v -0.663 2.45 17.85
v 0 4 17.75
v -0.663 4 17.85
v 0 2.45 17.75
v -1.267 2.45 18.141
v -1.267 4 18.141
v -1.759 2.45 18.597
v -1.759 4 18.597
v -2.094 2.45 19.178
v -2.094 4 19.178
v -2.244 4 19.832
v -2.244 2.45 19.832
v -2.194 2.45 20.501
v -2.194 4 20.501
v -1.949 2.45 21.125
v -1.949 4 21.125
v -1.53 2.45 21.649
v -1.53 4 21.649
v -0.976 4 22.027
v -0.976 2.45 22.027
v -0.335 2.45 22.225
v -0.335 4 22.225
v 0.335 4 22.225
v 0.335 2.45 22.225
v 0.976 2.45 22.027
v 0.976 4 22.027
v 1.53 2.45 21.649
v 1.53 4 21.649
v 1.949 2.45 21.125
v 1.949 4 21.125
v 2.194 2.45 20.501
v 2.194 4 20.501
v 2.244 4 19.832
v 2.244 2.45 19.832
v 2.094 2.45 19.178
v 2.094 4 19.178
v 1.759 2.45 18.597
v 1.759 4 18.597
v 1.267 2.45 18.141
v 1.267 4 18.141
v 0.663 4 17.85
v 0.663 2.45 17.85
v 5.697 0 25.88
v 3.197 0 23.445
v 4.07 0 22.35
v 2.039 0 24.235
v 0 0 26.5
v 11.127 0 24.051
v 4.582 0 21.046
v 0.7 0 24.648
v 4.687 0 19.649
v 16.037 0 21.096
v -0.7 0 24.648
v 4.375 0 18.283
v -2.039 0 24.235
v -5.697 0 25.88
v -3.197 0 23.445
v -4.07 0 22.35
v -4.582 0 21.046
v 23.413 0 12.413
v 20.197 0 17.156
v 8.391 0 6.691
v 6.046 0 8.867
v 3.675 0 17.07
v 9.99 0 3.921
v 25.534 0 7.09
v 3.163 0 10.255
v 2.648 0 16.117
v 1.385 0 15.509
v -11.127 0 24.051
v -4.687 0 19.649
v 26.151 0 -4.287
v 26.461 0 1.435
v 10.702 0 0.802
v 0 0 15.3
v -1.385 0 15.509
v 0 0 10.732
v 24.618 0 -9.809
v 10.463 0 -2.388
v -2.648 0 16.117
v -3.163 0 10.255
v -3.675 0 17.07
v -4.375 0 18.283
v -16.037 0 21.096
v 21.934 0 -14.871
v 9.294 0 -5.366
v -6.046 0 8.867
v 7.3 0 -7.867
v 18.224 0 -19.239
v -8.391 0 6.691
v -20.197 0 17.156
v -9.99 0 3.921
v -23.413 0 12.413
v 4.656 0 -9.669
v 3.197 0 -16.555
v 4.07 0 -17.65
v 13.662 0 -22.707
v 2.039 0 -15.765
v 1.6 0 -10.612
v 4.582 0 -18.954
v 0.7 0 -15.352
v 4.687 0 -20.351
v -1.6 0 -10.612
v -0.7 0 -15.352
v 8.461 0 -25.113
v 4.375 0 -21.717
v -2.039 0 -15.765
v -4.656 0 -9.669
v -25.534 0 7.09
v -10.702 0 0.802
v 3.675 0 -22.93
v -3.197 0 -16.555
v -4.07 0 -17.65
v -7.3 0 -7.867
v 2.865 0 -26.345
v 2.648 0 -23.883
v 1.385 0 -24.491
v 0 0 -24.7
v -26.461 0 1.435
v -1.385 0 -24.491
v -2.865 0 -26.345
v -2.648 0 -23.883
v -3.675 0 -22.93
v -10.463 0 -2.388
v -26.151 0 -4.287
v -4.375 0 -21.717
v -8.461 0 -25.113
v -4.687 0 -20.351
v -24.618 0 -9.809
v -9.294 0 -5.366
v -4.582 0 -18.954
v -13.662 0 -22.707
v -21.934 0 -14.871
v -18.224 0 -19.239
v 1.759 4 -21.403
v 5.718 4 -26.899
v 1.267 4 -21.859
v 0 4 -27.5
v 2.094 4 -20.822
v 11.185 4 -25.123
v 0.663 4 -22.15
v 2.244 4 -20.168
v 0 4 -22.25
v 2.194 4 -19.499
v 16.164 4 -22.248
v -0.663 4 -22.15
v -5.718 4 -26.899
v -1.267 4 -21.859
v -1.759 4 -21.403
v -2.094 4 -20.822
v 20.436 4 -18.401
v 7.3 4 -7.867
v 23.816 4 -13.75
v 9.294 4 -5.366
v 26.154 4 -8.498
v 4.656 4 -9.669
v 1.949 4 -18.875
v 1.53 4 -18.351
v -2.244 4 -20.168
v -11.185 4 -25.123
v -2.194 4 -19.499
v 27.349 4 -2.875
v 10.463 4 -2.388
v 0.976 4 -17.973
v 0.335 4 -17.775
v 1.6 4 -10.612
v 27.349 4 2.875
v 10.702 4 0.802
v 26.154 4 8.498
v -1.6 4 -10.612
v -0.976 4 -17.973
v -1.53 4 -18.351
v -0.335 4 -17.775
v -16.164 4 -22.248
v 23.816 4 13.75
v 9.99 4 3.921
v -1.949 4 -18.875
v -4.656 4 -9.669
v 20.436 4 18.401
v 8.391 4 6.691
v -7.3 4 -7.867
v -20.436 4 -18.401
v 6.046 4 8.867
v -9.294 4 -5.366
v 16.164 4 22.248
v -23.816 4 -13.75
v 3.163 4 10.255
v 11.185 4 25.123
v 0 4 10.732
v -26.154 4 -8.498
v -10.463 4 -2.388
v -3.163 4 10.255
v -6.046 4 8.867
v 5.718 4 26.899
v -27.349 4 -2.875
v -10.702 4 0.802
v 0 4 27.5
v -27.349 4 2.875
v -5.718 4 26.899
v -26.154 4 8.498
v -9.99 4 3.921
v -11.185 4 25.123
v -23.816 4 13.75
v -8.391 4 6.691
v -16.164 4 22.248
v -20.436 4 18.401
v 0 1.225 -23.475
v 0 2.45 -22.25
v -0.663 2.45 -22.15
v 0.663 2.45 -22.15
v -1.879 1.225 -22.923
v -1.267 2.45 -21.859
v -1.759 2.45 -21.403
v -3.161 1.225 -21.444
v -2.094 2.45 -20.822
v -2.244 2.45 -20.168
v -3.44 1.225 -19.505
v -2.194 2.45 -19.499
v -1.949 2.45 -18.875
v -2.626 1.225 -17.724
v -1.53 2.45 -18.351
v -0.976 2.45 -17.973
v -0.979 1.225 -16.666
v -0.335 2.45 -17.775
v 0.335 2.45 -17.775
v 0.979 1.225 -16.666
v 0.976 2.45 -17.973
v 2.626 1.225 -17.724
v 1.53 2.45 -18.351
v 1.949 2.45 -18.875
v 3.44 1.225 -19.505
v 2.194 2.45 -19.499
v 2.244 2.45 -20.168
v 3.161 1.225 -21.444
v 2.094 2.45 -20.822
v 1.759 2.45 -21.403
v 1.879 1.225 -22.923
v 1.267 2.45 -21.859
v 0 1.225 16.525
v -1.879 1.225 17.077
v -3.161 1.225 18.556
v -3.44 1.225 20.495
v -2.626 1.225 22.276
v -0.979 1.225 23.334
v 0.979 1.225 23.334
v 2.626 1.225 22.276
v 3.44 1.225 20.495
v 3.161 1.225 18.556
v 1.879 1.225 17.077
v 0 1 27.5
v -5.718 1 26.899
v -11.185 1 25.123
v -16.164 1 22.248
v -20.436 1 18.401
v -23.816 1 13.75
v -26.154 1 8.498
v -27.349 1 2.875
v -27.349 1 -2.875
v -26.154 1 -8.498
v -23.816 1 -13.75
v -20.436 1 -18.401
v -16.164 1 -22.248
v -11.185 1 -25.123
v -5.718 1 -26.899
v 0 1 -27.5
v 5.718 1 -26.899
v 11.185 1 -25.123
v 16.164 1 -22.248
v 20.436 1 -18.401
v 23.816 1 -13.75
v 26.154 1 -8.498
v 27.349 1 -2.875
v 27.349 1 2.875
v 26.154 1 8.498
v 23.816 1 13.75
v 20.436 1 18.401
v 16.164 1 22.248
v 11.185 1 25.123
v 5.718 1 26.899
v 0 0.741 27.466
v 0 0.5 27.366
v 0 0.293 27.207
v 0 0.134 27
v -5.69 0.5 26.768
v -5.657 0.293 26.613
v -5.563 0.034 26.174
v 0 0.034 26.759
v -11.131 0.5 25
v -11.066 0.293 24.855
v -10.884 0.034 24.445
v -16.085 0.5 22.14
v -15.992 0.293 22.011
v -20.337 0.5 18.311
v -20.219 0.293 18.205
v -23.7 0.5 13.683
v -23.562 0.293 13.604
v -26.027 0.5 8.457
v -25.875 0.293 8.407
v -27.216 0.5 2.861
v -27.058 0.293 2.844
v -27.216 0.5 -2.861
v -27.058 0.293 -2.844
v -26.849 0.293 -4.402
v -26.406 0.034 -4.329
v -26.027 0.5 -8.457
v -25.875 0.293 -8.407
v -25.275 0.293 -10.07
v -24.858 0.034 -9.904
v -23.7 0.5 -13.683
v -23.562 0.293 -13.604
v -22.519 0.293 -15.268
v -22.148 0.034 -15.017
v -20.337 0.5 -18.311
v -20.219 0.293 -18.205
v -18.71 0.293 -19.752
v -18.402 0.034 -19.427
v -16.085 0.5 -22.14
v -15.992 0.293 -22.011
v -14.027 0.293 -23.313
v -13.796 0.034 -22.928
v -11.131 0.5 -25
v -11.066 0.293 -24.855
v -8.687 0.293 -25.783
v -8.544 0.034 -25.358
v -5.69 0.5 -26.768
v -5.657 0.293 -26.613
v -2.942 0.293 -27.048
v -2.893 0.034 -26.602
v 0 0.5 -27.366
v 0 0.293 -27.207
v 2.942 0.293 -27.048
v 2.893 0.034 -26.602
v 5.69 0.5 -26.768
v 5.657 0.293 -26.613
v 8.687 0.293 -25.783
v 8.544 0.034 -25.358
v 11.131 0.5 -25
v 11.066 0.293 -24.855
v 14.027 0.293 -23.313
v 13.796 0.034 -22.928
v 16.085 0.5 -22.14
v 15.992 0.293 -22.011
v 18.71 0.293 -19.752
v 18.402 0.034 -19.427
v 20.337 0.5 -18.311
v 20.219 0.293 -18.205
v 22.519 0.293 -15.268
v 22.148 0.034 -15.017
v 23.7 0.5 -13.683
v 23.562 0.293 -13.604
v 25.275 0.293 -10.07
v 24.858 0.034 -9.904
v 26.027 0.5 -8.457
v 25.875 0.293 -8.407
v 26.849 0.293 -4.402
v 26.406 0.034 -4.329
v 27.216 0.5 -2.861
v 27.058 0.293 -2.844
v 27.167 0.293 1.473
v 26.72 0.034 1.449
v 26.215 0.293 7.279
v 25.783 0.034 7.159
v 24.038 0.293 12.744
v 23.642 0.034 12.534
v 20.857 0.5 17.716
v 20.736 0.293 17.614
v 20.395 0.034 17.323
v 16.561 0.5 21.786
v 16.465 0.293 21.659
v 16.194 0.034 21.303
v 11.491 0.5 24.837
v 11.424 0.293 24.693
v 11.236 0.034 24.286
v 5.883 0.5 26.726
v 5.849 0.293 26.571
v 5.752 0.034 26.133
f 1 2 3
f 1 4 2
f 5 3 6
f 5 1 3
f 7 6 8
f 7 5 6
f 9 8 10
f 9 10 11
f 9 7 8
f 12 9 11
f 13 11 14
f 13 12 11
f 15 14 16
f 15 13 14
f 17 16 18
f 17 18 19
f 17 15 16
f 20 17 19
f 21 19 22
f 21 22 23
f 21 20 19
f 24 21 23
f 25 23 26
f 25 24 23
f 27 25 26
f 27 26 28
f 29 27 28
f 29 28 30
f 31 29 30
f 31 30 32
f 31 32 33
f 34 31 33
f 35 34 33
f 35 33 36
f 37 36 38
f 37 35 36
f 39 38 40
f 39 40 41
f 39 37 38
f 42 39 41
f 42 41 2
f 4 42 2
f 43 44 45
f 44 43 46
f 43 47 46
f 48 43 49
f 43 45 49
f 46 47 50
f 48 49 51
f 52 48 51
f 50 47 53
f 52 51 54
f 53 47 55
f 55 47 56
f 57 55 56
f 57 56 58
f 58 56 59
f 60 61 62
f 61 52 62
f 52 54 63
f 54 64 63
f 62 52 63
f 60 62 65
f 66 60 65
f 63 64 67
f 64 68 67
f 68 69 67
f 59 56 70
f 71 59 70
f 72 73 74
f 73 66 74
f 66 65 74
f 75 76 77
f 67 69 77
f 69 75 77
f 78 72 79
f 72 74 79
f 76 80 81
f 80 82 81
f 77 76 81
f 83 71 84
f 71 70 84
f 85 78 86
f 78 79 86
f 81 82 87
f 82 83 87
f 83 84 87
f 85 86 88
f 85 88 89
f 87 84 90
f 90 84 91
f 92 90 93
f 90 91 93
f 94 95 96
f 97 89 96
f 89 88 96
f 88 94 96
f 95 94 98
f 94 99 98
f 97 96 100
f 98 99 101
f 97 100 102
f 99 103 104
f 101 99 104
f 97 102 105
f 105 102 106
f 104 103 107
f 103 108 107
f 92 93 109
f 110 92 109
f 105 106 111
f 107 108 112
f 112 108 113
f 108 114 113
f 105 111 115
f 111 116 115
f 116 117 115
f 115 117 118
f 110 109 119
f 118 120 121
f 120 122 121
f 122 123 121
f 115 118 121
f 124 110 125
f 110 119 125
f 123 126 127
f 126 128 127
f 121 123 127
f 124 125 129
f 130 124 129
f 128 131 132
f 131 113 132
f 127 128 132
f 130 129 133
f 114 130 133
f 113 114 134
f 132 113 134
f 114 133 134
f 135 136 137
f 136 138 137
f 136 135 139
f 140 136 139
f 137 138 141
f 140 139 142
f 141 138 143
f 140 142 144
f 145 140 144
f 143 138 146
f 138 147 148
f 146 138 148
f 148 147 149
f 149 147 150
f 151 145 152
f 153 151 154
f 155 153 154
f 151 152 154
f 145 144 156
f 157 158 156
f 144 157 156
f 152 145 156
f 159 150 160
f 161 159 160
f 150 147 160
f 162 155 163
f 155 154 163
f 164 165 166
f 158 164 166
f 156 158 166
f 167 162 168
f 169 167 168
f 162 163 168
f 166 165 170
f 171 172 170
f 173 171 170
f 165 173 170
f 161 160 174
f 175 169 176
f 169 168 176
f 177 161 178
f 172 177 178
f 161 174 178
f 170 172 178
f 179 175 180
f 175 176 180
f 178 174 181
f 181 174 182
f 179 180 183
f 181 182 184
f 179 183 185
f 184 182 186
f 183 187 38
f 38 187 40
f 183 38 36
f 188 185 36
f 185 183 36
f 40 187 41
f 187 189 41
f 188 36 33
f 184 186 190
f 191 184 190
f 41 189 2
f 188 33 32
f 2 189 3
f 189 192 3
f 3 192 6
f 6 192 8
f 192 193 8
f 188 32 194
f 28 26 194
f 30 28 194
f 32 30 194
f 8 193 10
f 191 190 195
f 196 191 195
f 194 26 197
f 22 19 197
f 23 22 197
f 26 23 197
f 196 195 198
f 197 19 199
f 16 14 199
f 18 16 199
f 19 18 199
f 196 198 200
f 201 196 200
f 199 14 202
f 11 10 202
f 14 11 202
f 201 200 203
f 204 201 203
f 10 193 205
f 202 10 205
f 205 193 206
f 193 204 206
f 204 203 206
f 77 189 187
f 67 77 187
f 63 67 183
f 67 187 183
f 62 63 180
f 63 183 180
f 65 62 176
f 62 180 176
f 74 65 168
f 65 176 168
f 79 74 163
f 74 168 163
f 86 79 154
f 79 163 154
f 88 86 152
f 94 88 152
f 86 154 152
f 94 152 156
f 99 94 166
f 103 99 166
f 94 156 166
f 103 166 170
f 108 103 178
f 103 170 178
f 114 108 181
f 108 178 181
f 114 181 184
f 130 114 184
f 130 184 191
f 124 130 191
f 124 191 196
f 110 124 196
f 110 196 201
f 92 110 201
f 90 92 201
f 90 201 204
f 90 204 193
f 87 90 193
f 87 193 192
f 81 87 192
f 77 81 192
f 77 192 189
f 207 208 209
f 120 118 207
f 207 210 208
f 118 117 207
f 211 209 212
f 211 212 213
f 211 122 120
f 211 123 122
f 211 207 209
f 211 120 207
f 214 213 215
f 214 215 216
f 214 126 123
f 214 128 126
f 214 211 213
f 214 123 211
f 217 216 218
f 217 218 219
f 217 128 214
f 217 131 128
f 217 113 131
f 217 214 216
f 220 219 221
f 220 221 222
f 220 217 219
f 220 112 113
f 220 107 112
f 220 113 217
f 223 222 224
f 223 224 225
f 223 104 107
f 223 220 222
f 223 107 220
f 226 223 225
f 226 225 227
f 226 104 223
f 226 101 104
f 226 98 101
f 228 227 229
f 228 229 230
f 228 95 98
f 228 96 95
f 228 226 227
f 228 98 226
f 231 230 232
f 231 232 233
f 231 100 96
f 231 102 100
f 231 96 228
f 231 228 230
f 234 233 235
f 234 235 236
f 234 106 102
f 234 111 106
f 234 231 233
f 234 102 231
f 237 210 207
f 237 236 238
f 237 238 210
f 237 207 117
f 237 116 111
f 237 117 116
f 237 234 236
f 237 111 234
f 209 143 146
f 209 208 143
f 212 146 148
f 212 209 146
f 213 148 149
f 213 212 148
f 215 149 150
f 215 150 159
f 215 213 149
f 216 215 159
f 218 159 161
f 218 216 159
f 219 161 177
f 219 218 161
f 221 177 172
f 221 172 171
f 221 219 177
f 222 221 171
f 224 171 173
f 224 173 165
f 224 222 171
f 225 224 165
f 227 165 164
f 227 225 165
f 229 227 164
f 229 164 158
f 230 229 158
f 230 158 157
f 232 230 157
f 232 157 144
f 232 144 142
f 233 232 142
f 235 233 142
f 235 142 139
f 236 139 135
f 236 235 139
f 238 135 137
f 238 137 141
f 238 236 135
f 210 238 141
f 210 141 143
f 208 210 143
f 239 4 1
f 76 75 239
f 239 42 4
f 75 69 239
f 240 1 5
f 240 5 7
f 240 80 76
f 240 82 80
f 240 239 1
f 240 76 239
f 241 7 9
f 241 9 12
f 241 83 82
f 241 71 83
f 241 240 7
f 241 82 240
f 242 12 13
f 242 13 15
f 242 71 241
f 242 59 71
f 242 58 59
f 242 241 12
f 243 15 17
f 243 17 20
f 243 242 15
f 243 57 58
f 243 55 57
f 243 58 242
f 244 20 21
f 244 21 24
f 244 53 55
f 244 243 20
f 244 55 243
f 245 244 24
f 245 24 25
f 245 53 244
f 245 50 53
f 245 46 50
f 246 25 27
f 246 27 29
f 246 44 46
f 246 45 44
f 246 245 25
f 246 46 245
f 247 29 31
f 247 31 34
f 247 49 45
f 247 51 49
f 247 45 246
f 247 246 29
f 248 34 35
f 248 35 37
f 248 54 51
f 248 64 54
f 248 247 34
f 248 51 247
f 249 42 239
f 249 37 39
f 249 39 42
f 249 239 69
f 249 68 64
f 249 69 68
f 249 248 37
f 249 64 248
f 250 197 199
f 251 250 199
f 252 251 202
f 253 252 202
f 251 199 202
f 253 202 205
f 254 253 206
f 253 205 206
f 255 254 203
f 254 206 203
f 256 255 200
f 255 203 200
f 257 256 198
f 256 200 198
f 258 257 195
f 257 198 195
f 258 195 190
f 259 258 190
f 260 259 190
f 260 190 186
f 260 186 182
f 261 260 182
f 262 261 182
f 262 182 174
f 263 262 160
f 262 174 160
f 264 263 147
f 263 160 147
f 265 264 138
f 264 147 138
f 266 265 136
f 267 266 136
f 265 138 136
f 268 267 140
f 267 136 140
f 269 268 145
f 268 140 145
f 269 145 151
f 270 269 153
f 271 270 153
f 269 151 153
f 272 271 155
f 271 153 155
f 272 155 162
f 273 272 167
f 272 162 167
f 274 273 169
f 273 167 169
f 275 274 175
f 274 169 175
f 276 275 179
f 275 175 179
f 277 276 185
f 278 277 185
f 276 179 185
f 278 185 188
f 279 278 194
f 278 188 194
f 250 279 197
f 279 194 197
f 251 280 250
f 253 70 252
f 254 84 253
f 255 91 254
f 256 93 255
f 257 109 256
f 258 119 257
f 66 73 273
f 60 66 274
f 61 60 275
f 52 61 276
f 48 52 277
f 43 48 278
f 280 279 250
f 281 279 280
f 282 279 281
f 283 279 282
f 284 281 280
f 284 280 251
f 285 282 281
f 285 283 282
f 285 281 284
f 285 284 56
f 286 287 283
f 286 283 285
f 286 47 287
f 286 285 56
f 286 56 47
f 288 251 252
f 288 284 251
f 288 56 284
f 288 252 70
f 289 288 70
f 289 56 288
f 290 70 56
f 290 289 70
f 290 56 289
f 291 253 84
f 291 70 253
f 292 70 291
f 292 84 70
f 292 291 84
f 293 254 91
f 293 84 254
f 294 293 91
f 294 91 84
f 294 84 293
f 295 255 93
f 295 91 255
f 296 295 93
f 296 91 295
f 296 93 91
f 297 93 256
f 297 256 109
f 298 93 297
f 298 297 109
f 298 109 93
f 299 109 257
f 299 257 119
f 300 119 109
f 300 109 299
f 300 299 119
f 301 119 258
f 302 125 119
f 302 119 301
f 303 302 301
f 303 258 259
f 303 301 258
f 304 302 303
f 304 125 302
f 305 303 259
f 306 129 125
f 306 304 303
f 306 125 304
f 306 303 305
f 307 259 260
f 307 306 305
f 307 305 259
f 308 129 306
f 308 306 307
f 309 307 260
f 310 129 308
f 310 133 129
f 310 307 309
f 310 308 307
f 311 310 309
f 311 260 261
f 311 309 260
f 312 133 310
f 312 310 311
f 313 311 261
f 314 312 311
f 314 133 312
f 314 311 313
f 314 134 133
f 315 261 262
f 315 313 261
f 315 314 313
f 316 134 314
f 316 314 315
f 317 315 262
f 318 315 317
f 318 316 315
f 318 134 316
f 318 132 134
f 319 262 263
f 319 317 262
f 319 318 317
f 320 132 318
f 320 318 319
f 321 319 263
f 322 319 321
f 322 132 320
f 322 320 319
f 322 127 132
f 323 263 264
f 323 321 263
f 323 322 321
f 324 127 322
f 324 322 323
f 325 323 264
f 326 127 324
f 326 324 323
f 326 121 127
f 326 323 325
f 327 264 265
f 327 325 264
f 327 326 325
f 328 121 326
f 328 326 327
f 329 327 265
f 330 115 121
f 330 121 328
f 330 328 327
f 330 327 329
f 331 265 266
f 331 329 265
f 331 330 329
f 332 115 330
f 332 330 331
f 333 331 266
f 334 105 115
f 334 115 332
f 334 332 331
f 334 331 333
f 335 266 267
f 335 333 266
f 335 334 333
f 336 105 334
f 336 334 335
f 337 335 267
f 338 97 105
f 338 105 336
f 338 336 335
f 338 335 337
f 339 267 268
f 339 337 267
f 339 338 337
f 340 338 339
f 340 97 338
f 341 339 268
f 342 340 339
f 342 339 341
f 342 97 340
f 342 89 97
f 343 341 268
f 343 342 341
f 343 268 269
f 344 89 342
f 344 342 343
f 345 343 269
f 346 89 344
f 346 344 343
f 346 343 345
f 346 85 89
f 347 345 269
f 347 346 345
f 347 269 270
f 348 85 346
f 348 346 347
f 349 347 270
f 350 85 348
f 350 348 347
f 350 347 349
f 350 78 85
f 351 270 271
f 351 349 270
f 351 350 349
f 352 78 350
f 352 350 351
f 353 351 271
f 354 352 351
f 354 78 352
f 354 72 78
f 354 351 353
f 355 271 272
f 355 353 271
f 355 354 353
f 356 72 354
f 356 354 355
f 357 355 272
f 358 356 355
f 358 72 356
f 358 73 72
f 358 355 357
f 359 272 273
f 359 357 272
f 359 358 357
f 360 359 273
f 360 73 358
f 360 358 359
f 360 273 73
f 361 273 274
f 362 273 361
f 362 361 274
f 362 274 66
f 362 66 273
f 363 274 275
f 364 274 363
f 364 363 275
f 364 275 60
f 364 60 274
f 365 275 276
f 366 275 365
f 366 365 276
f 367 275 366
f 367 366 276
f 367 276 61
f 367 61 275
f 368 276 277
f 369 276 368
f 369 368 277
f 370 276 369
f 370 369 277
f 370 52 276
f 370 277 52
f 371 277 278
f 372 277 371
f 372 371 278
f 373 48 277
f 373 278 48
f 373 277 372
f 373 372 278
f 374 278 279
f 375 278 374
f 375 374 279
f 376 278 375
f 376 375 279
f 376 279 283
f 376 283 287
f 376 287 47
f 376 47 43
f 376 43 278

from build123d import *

# Parameters (mm, degrees)
CSK_SLOT_FOR_M4_COUNTERSUNK_FLAT_HEA_2_COUNT = 2
CSK_SLOT_FOR_M4_COUNTERSUNK_FLAT_HEA_2_PITCH = 40
FILLET1_R                                    = 2
FILLET2_R                                    = 1
SKETCH5_R                                    = 32.94079545
CUT_EXTRUDE2_DEPTH                           = 10
SKETCH6_R                                    = 10.732050808
CUT_EXTRUDE3_DEPTH                           = 10


with BuildPart() as part:
    # Sketch1 → Revolve1 (revolve)
    with BuildSketch(Plane.XY, mode=Mode.PRIVATE) as revolve1_sk:
        Polygon((-27.5, 0), (-27.5, 4), (-13, 4), (-13, 8), (-11, 8), (-11, 3), (0, 3), (0, 0), align=None)
    revolve(revolve1_sk.sketch.rotate(Axis((0, 0, 0), (0, -1, 0)), 270), axis=Axis((0, 0, 0), (0, -1, 0)))

    # Sketch3 → CSK SLOT for M4 Countersunk Flat Head Screw1 (revolve, cut)
    with BuildSketch(Plane(origin=(0, 0, 20), x_dir=(0, 0, -1), z_dir=(1, 0, 0))):
        Polygon((0, 0), (0, 4), (2.25, 4), (2.25, 2.45), (4.7, 0), align=None)
    csk_slot_for_m4_countersunk_flat_head_sc = revolve(axis=Axis((0, -6.35, 20), (0, 1, 0)), mode=Mode.SUBTRACT)

    # CSK SLOT for M4 Countersunk Flat Hea 2: CSK SLOT for M4 Countersunk Flat Head Screw1 ×2
    with Locations(*[(0, 0, -i * CSK_SLOT_FOR_M4_COUNTERSUNK_FLAT_HEA_2_PITCH) for i in range(1, CSK_SLOT_FOR_M4_COUNTERSUNK_FLAT_HEA_2_COUNT)]):
        add(csk_slot_for_m4_countersunk_flat_head_sc, mode=Mode.SUBTRACT)

    # Fillet1
    fillet1_edges = [part.edges().sort_by_distance(p)[0] for p in [
        (0, 3, -11),
    ]]
    fillet(fillet1_edges, radius=FILLET1_R)

    # Fillet2
    fillet2_edges = [part.edges().sort_by_distance(p)[0] for p in [
        (0, 0, -27.5),
    ]]
    fillet(fillet2_edges, radius=FILLET2_R)

    # Sketch5 → Cut-Extrude2 (cut)
    with BuildSketch(Plane(origin=(0, 4, 0), x_dir=(1, 0, 0), z_dir=(0, 1, 0))):
        Circle(SKETCH5_R)
    extrude(amount=CUT_EXTRUDE2_DEPTH, mode=Mode.SUBTRACT)

    # Sketch6 → Cut-Extrude3 (cut)
    with BuildSketch(Plane(origin=(0, 4, 0), x_dir=(1, 0, 0), z_dir=(0, 1, 0))):
        with Locations(Location((0, 0, 0), (0, 0, 270))):
            Circle(SKETCH6_R)
    extrude(amount=-CUT_EXTRUDE3_DEPTH, mode=Mode.SUBTRACT)


solid = part.part
